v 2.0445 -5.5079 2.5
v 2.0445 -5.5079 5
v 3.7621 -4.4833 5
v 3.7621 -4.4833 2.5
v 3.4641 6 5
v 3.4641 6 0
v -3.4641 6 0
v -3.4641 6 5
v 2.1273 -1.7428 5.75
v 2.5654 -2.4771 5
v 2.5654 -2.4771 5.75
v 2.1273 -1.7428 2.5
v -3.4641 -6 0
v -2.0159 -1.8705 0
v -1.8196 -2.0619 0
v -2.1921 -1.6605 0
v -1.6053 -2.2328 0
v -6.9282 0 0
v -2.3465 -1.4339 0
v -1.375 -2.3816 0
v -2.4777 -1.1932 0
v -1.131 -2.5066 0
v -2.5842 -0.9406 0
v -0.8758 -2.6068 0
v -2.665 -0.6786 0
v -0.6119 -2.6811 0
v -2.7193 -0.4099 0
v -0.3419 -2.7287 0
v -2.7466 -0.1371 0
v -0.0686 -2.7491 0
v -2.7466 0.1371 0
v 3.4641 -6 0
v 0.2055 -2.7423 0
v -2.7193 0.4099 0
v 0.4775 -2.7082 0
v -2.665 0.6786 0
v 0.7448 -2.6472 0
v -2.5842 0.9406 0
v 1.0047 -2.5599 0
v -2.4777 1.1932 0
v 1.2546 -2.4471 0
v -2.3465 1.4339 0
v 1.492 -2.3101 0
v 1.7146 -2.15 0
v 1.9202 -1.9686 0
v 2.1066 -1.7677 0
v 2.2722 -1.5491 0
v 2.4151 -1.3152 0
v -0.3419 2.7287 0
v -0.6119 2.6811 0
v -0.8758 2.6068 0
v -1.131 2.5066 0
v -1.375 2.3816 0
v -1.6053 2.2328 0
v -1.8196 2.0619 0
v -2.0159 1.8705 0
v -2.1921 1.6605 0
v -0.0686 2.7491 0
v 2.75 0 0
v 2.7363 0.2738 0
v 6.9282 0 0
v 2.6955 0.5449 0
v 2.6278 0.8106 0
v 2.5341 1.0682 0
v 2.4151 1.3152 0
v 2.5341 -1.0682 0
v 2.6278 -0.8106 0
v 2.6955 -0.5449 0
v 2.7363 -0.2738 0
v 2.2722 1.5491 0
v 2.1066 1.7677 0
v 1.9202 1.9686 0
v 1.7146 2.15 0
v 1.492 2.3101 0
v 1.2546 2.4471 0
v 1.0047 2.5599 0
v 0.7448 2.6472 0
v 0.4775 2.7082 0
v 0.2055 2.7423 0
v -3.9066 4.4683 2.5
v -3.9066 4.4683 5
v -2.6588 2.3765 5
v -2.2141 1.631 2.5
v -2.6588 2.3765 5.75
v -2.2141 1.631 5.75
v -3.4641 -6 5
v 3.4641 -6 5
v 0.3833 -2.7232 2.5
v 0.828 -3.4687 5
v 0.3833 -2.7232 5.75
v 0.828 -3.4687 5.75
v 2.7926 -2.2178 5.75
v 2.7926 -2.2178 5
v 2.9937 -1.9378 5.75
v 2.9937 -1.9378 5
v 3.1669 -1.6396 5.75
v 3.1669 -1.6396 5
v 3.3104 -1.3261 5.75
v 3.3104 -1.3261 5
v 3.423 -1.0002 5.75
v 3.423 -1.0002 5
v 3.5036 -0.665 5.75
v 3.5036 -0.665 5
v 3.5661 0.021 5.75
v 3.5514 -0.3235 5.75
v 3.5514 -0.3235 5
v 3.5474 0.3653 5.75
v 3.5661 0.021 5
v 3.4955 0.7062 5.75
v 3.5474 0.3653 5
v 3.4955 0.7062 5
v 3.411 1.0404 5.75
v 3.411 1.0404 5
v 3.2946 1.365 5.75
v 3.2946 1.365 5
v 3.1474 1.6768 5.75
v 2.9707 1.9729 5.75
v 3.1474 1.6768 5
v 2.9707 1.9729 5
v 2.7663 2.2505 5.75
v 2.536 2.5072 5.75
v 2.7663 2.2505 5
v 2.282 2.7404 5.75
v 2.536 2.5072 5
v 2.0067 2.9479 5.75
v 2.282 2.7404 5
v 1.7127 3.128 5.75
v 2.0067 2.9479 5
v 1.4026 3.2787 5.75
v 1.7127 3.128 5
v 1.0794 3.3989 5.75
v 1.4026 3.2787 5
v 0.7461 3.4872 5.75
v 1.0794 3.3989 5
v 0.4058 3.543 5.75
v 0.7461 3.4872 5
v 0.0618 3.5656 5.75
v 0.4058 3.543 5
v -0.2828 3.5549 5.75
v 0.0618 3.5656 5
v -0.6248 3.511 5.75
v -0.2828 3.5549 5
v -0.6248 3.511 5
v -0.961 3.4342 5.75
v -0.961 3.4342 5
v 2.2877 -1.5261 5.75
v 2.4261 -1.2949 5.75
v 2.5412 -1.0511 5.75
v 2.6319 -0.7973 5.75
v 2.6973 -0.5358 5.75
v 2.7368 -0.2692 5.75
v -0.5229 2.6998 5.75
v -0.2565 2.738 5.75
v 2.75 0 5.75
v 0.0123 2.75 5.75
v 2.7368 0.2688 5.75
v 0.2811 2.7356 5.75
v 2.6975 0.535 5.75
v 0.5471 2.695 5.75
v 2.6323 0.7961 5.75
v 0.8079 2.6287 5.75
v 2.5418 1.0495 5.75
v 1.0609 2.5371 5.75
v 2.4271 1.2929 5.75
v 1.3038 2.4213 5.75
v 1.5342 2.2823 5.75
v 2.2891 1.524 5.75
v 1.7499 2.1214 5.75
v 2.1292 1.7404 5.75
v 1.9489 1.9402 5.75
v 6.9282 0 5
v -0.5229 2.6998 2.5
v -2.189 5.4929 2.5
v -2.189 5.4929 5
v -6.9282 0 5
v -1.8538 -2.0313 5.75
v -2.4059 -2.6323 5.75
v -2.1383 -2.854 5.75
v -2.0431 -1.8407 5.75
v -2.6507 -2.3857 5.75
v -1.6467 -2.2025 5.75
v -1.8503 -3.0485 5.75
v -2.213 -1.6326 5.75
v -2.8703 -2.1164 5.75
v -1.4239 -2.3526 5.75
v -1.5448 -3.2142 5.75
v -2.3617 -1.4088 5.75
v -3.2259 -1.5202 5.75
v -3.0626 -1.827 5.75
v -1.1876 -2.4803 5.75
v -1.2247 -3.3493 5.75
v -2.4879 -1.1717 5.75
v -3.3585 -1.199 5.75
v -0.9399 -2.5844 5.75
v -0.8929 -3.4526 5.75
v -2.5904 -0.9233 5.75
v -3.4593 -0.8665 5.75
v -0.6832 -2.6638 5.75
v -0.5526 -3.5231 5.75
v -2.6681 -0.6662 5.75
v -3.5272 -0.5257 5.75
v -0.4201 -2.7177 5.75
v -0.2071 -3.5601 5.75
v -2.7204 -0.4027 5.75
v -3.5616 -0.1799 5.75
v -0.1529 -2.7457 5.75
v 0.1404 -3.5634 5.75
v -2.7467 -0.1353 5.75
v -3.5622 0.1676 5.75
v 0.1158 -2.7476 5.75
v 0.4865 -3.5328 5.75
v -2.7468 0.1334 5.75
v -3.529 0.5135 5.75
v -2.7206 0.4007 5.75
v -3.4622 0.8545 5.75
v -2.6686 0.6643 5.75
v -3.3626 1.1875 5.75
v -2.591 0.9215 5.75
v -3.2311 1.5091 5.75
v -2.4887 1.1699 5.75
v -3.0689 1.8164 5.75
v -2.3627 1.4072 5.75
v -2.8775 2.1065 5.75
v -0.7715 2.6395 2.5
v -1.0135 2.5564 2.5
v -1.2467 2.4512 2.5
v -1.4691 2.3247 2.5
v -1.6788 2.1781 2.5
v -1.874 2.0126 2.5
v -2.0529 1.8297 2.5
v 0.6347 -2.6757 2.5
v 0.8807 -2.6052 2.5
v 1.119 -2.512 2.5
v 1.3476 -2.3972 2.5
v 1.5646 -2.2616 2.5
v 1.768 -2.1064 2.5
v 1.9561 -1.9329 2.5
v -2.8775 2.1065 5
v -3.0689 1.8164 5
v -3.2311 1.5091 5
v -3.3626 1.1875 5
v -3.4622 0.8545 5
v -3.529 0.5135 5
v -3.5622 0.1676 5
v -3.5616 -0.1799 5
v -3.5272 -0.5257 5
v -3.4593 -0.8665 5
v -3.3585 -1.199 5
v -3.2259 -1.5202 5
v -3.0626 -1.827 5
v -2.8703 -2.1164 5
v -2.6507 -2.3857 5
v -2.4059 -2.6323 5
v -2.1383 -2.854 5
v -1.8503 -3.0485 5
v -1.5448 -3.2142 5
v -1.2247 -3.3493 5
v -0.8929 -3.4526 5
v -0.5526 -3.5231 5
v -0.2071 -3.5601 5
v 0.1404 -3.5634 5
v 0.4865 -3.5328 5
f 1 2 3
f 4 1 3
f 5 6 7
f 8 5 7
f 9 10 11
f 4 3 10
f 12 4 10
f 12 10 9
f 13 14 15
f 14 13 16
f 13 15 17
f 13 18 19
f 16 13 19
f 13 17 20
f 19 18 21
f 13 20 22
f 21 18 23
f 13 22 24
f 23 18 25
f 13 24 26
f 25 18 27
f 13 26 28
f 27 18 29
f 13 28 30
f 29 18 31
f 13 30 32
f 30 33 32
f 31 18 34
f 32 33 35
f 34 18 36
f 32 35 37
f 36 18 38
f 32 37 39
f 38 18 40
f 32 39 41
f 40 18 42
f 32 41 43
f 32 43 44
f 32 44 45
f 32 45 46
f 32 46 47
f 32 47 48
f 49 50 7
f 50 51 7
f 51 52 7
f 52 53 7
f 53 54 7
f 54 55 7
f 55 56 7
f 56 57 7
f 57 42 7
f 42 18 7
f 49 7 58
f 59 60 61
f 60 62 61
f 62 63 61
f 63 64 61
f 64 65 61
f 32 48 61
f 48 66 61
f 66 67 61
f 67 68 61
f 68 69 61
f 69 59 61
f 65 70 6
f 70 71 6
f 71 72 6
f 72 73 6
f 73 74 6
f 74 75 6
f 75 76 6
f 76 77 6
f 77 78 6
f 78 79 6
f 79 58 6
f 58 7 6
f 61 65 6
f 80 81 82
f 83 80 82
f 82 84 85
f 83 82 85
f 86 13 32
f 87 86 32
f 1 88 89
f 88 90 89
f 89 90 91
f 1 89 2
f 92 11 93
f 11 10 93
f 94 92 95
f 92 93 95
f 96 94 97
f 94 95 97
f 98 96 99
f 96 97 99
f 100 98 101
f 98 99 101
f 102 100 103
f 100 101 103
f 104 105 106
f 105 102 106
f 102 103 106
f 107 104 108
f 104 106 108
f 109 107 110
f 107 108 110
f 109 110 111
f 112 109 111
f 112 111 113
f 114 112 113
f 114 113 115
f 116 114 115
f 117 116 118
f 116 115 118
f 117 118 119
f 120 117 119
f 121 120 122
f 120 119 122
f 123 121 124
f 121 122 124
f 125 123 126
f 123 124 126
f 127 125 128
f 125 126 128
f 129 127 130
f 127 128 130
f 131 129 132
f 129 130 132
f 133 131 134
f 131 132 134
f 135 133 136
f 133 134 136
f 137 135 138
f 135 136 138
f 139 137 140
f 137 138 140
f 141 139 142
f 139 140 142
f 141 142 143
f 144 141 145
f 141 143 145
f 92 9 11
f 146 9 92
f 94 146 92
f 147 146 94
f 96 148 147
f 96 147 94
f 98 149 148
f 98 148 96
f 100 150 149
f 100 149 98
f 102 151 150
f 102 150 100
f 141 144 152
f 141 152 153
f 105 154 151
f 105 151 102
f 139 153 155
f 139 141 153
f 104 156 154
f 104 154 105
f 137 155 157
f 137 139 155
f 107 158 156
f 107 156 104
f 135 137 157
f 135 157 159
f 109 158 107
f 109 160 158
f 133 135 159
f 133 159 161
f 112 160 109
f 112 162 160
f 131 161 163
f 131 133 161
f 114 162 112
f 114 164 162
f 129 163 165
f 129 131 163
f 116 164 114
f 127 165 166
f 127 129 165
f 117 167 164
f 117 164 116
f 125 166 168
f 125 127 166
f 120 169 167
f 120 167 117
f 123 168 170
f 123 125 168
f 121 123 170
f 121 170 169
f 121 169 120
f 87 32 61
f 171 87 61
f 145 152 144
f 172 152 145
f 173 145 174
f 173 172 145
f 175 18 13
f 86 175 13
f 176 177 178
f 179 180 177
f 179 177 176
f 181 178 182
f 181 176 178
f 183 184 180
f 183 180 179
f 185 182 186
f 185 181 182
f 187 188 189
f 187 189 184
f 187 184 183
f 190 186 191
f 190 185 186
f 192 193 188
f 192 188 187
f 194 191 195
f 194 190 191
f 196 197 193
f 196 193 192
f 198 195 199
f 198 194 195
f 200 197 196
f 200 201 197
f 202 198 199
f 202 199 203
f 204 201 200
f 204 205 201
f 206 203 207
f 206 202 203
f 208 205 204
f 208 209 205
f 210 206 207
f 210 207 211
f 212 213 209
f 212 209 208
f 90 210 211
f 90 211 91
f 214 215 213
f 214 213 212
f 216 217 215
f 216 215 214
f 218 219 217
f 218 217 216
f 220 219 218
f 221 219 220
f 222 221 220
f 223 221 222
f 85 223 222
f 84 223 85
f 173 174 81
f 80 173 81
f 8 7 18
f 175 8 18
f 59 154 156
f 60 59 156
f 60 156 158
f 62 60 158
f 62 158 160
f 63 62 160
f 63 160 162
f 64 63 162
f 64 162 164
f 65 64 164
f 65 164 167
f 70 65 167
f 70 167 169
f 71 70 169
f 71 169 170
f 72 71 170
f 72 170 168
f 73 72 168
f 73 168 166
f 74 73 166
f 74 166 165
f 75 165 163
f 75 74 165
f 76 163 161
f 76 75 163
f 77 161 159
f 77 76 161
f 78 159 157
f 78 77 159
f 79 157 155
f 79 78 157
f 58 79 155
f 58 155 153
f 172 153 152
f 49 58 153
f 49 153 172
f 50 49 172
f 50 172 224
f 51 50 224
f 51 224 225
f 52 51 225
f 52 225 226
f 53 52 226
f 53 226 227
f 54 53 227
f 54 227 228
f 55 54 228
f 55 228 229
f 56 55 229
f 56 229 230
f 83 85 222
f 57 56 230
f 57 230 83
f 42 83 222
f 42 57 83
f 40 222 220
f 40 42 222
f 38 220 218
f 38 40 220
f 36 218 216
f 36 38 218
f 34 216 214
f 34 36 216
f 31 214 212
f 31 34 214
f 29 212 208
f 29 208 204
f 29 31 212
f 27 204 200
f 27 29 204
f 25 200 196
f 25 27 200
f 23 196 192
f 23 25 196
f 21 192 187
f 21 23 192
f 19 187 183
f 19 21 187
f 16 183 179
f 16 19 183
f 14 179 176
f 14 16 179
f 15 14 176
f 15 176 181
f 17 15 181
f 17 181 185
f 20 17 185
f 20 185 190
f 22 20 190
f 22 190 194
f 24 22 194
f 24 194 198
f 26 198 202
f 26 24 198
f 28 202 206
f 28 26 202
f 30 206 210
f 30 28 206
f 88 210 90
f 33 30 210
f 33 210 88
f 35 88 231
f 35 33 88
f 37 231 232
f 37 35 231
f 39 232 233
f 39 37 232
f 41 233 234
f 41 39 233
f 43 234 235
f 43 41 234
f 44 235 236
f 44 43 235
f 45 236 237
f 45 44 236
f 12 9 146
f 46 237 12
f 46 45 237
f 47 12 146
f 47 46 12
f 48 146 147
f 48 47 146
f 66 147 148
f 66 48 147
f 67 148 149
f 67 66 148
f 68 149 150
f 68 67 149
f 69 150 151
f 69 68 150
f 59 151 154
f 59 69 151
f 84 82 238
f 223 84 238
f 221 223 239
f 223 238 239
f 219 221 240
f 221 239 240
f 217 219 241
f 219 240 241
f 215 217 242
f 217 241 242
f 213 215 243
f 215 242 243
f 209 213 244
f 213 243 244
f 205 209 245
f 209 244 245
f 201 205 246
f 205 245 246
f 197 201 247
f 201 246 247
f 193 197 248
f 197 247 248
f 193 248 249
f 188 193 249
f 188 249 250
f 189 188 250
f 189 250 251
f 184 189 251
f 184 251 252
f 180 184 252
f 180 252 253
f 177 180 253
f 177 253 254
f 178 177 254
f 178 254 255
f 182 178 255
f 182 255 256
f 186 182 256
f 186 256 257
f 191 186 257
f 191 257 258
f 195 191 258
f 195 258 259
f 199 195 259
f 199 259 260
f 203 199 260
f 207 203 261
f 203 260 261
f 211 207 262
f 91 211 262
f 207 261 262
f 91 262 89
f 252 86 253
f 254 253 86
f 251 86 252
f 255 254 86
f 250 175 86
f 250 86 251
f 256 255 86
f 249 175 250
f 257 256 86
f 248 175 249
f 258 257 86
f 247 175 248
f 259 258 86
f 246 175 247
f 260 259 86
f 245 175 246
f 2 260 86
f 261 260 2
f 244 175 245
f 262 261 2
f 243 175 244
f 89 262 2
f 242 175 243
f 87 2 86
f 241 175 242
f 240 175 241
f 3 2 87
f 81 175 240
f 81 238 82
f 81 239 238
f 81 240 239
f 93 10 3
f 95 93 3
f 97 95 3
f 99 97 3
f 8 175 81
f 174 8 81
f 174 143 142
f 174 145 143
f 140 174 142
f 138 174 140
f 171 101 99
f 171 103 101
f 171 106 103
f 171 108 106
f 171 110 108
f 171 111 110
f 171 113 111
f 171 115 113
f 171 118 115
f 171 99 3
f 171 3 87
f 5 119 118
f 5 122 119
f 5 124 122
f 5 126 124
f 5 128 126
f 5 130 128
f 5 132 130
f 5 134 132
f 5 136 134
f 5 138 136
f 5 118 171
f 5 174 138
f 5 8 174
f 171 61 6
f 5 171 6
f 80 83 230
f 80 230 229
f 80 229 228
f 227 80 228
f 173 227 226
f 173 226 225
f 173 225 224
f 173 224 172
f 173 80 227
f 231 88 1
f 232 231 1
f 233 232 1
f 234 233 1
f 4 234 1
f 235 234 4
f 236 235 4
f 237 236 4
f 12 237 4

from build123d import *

# Parameters (mm, degrees)
F0_R     = 2.75
F1_DEPTH = 5
F2_R     = 3.5661431143
F2_R_2   = 2.75
F3_DEPTH = 0.75
F5_DEPTH = 2.5
F6_DEPTH = 25


with BuildPart() as f1:
    # F0 (on Top) → F1 (new body)
    with BuildSketch(Plane.XY):
        Polygon((3.4641016151, 6), (-3.4641016151, 6), (-6.9282032303, 0), (-3.4641016151, -6), (3.4641016151, -6), (6.9282032303, 0), align=None)
        Circle(F0_R, mode=Mode.SUBTRACT)
    extrude(amount=F1_DEPTH)

    # F2 (on face) → F3 (join)
    with BuildSketch(Plane.XY.offset(5)):
        Circle(F2_R)
        Circle(F2_R_2, mode=Mode.SUBTRACT)
    extrude(amount=F3_DEPTH)

    # F4 (on face) → F5 (cut)
    with BuildSketch(Plane.XY.offset(5)):
        Polygon((-2.1890449113, 5.4928889455), (-3.906649748, 4.4682750548), (2.0444942813, -5.5078865623), (3.7620991179, -4.4832726717), align=None)
    extrude(amount=-F5_DEPTH, mode=Mode.SUBTRACT)

    # F6 (cut): faces of the model
    f6_faces = [f1.faces().sort_by_distance(p)[0] for p in [
        (-1.6478181141, 2.6289073274, 5),
        (1.5304323639, -2.698932206, 5),
        (-1.6478181141, 2.6289073274, 5),
        (1.5304323639, -2.698932206, 5),
    ]]
    extrude(f6_faces, amount=-F6_DEPTH, mode=Mode.SUBTRACT)


solid = f1.part
